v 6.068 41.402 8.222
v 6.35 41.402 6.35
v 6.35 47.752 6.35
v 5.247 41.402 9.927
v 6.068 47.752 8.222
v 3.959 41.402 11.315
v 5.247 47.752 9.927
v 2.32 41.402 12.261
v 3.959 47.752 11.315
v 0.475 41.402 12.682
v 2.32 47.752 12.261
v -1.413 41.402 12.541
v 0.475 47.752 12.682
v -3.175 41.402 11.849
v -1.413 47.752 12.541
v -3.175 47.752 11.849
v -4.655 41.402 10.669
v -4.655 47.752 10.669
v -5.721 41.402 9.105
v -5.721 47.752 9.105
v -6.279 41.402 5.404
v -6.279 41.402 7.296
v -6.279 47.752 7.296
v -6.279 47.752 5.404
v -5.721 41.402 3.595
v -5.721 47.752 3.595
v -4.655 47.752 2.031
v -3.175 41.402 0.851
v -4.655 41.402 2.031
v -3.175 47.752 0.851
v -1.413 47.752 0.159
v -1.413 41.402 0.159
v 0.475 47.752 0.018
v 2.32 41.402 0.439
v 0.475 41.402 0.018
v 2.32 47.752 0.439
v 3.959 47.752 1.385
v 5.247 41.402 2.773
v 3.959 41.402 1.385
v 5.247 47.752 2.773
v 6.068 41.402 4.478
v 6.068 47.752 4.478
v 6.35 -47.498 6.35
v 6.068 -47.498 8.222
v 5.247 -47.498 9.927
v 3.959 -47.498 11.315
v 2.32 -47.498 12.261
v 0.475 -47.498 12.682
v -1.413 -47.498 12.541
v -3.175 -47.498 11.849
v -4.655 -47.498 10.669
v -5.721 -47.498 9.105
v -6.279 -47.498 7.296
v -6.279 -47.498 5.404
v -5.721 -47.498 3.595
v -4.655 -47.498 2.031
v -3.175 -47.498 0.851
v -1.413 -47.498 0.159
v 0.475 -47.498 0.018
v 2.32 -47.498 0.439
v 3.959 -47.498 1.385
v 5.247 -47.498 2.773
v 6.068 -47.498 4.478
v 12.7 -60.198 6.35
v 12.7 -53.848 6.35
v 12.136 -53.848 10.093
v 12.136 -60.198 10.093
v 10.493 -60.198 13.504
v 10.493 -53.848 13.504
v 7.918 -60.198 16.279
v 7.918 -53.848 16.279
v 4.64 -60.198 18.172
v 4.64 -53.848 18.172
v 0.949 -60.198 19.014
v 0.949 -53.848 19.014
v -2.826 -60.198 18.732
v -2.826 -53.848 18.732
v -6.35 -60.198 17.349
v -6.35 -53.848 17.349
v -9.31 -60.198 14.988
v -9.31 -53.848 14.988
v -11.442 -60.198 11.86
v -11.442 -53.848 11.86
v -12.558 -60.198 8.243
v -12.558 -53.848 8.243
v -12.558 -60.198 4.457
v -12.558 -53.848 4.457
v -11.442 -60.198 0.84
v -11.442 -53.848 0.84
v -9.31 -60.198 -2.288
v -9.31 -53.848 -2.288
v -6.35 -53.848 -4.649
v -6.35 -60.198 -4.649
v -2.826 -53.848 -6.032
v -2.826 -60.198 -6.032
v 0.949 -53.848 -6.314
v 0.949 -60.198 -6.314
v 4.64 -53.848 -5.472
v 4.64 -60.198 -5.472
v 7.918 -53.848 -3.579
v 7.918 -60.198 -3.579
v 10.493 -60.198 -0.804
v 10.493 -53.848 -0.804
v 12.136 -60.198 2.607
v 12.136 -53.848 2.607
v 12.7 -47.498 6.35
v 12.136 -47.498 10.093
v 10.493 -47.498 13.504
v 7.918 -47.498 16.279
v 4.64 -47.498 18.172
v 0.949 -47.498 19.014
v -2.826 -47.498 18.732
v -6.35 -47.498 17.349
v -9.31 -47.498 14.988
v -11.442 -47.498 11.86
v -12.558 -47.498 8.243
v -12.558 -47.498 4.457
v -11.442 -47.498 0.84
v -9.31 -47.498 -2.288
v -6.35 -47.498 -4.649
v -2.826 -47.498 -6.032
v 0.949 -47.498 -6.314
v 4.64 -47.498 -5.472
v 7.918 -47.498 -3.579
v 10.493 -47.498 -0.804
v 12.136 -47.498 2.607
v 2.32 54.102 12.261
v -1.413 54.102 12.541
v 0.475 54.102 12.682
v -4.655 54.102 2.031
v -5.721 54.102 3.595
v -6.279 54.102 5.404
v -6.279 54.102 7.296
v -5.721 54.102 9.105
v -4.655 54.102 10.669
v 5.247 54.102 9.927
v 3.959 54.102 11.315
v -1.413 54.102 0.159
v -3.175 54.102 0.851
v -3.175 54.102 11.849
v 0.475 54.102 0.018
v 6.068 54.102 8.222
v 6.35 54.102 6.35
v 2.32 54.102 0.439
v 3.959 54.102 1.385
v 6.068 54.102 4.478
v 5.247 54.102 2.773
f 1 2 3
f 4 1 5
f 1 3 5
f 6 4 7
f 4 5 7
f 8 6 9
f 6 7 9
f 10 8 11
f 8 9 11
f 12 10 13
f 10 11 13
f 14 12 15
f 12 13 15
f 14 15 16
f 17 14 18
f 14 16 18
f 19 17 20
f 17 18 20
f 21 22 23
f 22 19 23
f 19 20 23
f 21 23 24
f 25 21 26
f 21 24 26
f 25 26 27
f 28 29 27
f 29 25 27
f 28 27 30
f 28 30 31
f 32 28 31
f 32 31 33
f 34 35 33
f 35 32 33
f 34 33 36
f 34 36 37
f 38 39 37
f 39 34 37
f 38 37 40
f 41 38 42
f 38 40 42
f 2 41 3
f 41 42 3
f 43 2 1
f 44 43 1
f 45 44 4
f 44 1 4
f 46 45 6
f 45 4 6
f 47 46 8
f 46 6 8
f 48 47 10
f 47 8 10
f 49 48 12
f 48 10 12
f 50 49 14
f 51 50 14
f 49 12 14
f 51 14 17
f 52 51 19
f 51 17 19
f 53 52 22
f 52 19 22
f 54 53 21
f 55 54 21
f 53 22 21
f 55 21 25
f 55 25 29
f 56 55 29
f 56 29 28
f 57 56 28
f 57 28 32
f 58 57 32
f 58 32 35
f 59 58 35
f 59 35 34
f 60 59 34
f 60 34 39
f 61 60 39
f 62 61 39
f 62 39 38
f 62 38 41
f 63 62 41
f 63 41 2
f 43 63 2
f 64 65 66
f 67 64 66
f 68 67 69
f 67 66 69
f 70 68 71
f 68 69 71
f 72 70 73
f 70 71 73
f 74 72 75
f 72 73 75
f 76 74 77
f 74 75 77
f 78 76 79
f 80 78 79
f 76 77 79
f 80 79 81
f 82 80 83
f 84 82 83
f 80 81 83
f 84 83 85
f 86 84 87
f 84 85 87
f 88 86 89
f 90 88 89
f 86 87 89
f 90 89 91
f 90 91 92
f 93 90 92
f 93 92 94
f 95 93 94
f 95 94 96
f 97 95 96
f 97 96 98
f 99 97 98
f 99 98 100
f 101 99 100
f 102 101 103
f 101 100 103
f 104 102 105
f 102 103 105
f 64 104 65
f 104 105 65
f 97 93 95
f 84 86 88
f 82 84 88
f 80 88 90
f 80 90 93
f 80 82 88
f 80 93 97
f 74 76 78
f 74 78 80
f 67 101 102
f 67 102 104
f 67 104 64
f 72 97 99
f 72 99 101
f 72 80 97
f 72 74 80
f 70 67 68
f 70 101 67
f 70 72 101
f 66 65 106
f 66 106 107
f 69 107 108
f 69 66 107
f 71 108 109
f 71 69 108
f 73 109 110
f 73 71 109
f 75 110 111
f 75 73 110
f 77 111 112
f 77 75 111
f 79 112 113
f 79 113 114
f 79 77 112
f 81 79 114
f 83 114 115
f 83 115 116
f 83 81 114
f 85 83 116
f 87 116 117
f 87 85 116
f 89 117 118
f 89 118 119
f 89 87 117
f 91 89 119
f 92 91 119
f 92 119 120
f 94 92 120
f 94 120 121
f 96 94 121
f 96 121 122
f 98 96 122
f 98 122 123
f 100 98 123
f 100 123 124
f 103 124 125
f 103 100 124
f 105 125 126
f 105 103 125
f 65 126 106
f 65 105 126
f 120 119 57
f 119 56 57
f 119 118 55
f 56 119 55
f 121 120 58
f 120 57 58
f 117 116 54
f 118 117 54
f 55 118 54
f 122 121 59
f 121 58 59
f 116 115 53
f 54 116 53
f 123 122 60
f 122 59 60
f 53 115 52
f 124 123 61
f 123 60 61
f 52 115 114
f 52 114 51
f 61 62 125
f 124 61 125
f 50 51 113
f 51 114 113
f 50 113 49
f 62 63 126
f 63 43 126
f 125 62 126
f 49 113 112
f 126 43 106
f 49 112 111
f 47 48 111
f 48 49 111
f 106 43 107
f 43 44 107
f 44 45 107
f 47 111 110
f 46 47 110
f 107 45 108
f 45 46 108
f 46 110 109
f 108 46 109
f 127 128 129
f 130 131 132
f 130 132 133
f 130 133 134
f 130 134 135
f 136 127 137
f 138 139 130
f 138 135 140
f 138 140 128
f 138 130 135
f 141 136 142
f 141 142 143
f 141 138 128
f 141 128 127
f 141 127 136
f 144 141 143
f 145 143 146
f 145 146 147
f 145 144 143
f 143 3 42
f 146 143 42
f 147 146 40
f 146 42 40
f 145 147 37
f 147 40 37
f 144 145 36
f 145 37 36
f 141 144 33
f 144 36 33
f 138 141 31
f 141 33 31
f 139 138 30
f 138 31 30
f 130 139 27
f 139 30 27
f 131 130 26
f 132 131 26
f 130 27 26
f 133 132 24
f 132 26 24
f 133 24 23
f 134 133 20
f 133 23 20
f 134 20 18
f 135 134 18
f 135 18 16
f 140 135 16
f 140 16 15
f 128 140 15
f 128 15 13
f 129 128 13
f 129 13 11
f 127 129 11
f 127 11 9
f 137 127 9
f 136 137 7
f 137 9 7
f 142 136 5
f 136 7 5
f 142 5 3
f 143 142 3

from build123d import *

# Parameters (mm, degrees)
F0_R       = 6.35
F1_DEPTH   = 101.6
F1_FACE1_R = 6.35
F2_R       = 12.7
F2_R_2     = 6.35
F1_FACE_R  = 6.35
F3_DEPTH   = 6.35


with BuildPart() as f1:
    # F0 (on Front) → F1 (new body)
    with BuildSketch(Plane.XZ):
        with Locations((0, 6.35)):
            Circle(F0_R)
    extrude(amount=F1_DEPTH)

    # F1_face1 (on face) + F2 (on face) + F1_face (on face) → F3 (join, symmetric)
    with BuildSketch(Plane(origin=(0, 0, 6.35), x_dir=(1, 0, 0), z_dir=(0, 1, 0))):
        Circle(F1_FACE1_R)
    with BuildSketch(Plane.XZ.offset(101.6)):
        with Locations((0, 6.35)):
            Circle(F2_R)
        with Locations((0, 6.35)):
            Circle(F2_R_2, mode=Mode.SUBTRACT)
        with Locations((0, 6.35)):
            Circle(F2_R_2)
    with BuildSketch(Plane(origin=(0, -101.6, 6.35), x_dir=(1, 0, 0), z_dir=(0, -1, 0))):
        Circle(F1_FACE_R)
    extrude(amount=F3_DEPTH, both=True, dir=(0, 1, 0))


with BuildPart() as f1_1:
    # F4: moved
    add(f1.part.moved(Location((0, 47.752, 0))))


solid = f1_1.part
